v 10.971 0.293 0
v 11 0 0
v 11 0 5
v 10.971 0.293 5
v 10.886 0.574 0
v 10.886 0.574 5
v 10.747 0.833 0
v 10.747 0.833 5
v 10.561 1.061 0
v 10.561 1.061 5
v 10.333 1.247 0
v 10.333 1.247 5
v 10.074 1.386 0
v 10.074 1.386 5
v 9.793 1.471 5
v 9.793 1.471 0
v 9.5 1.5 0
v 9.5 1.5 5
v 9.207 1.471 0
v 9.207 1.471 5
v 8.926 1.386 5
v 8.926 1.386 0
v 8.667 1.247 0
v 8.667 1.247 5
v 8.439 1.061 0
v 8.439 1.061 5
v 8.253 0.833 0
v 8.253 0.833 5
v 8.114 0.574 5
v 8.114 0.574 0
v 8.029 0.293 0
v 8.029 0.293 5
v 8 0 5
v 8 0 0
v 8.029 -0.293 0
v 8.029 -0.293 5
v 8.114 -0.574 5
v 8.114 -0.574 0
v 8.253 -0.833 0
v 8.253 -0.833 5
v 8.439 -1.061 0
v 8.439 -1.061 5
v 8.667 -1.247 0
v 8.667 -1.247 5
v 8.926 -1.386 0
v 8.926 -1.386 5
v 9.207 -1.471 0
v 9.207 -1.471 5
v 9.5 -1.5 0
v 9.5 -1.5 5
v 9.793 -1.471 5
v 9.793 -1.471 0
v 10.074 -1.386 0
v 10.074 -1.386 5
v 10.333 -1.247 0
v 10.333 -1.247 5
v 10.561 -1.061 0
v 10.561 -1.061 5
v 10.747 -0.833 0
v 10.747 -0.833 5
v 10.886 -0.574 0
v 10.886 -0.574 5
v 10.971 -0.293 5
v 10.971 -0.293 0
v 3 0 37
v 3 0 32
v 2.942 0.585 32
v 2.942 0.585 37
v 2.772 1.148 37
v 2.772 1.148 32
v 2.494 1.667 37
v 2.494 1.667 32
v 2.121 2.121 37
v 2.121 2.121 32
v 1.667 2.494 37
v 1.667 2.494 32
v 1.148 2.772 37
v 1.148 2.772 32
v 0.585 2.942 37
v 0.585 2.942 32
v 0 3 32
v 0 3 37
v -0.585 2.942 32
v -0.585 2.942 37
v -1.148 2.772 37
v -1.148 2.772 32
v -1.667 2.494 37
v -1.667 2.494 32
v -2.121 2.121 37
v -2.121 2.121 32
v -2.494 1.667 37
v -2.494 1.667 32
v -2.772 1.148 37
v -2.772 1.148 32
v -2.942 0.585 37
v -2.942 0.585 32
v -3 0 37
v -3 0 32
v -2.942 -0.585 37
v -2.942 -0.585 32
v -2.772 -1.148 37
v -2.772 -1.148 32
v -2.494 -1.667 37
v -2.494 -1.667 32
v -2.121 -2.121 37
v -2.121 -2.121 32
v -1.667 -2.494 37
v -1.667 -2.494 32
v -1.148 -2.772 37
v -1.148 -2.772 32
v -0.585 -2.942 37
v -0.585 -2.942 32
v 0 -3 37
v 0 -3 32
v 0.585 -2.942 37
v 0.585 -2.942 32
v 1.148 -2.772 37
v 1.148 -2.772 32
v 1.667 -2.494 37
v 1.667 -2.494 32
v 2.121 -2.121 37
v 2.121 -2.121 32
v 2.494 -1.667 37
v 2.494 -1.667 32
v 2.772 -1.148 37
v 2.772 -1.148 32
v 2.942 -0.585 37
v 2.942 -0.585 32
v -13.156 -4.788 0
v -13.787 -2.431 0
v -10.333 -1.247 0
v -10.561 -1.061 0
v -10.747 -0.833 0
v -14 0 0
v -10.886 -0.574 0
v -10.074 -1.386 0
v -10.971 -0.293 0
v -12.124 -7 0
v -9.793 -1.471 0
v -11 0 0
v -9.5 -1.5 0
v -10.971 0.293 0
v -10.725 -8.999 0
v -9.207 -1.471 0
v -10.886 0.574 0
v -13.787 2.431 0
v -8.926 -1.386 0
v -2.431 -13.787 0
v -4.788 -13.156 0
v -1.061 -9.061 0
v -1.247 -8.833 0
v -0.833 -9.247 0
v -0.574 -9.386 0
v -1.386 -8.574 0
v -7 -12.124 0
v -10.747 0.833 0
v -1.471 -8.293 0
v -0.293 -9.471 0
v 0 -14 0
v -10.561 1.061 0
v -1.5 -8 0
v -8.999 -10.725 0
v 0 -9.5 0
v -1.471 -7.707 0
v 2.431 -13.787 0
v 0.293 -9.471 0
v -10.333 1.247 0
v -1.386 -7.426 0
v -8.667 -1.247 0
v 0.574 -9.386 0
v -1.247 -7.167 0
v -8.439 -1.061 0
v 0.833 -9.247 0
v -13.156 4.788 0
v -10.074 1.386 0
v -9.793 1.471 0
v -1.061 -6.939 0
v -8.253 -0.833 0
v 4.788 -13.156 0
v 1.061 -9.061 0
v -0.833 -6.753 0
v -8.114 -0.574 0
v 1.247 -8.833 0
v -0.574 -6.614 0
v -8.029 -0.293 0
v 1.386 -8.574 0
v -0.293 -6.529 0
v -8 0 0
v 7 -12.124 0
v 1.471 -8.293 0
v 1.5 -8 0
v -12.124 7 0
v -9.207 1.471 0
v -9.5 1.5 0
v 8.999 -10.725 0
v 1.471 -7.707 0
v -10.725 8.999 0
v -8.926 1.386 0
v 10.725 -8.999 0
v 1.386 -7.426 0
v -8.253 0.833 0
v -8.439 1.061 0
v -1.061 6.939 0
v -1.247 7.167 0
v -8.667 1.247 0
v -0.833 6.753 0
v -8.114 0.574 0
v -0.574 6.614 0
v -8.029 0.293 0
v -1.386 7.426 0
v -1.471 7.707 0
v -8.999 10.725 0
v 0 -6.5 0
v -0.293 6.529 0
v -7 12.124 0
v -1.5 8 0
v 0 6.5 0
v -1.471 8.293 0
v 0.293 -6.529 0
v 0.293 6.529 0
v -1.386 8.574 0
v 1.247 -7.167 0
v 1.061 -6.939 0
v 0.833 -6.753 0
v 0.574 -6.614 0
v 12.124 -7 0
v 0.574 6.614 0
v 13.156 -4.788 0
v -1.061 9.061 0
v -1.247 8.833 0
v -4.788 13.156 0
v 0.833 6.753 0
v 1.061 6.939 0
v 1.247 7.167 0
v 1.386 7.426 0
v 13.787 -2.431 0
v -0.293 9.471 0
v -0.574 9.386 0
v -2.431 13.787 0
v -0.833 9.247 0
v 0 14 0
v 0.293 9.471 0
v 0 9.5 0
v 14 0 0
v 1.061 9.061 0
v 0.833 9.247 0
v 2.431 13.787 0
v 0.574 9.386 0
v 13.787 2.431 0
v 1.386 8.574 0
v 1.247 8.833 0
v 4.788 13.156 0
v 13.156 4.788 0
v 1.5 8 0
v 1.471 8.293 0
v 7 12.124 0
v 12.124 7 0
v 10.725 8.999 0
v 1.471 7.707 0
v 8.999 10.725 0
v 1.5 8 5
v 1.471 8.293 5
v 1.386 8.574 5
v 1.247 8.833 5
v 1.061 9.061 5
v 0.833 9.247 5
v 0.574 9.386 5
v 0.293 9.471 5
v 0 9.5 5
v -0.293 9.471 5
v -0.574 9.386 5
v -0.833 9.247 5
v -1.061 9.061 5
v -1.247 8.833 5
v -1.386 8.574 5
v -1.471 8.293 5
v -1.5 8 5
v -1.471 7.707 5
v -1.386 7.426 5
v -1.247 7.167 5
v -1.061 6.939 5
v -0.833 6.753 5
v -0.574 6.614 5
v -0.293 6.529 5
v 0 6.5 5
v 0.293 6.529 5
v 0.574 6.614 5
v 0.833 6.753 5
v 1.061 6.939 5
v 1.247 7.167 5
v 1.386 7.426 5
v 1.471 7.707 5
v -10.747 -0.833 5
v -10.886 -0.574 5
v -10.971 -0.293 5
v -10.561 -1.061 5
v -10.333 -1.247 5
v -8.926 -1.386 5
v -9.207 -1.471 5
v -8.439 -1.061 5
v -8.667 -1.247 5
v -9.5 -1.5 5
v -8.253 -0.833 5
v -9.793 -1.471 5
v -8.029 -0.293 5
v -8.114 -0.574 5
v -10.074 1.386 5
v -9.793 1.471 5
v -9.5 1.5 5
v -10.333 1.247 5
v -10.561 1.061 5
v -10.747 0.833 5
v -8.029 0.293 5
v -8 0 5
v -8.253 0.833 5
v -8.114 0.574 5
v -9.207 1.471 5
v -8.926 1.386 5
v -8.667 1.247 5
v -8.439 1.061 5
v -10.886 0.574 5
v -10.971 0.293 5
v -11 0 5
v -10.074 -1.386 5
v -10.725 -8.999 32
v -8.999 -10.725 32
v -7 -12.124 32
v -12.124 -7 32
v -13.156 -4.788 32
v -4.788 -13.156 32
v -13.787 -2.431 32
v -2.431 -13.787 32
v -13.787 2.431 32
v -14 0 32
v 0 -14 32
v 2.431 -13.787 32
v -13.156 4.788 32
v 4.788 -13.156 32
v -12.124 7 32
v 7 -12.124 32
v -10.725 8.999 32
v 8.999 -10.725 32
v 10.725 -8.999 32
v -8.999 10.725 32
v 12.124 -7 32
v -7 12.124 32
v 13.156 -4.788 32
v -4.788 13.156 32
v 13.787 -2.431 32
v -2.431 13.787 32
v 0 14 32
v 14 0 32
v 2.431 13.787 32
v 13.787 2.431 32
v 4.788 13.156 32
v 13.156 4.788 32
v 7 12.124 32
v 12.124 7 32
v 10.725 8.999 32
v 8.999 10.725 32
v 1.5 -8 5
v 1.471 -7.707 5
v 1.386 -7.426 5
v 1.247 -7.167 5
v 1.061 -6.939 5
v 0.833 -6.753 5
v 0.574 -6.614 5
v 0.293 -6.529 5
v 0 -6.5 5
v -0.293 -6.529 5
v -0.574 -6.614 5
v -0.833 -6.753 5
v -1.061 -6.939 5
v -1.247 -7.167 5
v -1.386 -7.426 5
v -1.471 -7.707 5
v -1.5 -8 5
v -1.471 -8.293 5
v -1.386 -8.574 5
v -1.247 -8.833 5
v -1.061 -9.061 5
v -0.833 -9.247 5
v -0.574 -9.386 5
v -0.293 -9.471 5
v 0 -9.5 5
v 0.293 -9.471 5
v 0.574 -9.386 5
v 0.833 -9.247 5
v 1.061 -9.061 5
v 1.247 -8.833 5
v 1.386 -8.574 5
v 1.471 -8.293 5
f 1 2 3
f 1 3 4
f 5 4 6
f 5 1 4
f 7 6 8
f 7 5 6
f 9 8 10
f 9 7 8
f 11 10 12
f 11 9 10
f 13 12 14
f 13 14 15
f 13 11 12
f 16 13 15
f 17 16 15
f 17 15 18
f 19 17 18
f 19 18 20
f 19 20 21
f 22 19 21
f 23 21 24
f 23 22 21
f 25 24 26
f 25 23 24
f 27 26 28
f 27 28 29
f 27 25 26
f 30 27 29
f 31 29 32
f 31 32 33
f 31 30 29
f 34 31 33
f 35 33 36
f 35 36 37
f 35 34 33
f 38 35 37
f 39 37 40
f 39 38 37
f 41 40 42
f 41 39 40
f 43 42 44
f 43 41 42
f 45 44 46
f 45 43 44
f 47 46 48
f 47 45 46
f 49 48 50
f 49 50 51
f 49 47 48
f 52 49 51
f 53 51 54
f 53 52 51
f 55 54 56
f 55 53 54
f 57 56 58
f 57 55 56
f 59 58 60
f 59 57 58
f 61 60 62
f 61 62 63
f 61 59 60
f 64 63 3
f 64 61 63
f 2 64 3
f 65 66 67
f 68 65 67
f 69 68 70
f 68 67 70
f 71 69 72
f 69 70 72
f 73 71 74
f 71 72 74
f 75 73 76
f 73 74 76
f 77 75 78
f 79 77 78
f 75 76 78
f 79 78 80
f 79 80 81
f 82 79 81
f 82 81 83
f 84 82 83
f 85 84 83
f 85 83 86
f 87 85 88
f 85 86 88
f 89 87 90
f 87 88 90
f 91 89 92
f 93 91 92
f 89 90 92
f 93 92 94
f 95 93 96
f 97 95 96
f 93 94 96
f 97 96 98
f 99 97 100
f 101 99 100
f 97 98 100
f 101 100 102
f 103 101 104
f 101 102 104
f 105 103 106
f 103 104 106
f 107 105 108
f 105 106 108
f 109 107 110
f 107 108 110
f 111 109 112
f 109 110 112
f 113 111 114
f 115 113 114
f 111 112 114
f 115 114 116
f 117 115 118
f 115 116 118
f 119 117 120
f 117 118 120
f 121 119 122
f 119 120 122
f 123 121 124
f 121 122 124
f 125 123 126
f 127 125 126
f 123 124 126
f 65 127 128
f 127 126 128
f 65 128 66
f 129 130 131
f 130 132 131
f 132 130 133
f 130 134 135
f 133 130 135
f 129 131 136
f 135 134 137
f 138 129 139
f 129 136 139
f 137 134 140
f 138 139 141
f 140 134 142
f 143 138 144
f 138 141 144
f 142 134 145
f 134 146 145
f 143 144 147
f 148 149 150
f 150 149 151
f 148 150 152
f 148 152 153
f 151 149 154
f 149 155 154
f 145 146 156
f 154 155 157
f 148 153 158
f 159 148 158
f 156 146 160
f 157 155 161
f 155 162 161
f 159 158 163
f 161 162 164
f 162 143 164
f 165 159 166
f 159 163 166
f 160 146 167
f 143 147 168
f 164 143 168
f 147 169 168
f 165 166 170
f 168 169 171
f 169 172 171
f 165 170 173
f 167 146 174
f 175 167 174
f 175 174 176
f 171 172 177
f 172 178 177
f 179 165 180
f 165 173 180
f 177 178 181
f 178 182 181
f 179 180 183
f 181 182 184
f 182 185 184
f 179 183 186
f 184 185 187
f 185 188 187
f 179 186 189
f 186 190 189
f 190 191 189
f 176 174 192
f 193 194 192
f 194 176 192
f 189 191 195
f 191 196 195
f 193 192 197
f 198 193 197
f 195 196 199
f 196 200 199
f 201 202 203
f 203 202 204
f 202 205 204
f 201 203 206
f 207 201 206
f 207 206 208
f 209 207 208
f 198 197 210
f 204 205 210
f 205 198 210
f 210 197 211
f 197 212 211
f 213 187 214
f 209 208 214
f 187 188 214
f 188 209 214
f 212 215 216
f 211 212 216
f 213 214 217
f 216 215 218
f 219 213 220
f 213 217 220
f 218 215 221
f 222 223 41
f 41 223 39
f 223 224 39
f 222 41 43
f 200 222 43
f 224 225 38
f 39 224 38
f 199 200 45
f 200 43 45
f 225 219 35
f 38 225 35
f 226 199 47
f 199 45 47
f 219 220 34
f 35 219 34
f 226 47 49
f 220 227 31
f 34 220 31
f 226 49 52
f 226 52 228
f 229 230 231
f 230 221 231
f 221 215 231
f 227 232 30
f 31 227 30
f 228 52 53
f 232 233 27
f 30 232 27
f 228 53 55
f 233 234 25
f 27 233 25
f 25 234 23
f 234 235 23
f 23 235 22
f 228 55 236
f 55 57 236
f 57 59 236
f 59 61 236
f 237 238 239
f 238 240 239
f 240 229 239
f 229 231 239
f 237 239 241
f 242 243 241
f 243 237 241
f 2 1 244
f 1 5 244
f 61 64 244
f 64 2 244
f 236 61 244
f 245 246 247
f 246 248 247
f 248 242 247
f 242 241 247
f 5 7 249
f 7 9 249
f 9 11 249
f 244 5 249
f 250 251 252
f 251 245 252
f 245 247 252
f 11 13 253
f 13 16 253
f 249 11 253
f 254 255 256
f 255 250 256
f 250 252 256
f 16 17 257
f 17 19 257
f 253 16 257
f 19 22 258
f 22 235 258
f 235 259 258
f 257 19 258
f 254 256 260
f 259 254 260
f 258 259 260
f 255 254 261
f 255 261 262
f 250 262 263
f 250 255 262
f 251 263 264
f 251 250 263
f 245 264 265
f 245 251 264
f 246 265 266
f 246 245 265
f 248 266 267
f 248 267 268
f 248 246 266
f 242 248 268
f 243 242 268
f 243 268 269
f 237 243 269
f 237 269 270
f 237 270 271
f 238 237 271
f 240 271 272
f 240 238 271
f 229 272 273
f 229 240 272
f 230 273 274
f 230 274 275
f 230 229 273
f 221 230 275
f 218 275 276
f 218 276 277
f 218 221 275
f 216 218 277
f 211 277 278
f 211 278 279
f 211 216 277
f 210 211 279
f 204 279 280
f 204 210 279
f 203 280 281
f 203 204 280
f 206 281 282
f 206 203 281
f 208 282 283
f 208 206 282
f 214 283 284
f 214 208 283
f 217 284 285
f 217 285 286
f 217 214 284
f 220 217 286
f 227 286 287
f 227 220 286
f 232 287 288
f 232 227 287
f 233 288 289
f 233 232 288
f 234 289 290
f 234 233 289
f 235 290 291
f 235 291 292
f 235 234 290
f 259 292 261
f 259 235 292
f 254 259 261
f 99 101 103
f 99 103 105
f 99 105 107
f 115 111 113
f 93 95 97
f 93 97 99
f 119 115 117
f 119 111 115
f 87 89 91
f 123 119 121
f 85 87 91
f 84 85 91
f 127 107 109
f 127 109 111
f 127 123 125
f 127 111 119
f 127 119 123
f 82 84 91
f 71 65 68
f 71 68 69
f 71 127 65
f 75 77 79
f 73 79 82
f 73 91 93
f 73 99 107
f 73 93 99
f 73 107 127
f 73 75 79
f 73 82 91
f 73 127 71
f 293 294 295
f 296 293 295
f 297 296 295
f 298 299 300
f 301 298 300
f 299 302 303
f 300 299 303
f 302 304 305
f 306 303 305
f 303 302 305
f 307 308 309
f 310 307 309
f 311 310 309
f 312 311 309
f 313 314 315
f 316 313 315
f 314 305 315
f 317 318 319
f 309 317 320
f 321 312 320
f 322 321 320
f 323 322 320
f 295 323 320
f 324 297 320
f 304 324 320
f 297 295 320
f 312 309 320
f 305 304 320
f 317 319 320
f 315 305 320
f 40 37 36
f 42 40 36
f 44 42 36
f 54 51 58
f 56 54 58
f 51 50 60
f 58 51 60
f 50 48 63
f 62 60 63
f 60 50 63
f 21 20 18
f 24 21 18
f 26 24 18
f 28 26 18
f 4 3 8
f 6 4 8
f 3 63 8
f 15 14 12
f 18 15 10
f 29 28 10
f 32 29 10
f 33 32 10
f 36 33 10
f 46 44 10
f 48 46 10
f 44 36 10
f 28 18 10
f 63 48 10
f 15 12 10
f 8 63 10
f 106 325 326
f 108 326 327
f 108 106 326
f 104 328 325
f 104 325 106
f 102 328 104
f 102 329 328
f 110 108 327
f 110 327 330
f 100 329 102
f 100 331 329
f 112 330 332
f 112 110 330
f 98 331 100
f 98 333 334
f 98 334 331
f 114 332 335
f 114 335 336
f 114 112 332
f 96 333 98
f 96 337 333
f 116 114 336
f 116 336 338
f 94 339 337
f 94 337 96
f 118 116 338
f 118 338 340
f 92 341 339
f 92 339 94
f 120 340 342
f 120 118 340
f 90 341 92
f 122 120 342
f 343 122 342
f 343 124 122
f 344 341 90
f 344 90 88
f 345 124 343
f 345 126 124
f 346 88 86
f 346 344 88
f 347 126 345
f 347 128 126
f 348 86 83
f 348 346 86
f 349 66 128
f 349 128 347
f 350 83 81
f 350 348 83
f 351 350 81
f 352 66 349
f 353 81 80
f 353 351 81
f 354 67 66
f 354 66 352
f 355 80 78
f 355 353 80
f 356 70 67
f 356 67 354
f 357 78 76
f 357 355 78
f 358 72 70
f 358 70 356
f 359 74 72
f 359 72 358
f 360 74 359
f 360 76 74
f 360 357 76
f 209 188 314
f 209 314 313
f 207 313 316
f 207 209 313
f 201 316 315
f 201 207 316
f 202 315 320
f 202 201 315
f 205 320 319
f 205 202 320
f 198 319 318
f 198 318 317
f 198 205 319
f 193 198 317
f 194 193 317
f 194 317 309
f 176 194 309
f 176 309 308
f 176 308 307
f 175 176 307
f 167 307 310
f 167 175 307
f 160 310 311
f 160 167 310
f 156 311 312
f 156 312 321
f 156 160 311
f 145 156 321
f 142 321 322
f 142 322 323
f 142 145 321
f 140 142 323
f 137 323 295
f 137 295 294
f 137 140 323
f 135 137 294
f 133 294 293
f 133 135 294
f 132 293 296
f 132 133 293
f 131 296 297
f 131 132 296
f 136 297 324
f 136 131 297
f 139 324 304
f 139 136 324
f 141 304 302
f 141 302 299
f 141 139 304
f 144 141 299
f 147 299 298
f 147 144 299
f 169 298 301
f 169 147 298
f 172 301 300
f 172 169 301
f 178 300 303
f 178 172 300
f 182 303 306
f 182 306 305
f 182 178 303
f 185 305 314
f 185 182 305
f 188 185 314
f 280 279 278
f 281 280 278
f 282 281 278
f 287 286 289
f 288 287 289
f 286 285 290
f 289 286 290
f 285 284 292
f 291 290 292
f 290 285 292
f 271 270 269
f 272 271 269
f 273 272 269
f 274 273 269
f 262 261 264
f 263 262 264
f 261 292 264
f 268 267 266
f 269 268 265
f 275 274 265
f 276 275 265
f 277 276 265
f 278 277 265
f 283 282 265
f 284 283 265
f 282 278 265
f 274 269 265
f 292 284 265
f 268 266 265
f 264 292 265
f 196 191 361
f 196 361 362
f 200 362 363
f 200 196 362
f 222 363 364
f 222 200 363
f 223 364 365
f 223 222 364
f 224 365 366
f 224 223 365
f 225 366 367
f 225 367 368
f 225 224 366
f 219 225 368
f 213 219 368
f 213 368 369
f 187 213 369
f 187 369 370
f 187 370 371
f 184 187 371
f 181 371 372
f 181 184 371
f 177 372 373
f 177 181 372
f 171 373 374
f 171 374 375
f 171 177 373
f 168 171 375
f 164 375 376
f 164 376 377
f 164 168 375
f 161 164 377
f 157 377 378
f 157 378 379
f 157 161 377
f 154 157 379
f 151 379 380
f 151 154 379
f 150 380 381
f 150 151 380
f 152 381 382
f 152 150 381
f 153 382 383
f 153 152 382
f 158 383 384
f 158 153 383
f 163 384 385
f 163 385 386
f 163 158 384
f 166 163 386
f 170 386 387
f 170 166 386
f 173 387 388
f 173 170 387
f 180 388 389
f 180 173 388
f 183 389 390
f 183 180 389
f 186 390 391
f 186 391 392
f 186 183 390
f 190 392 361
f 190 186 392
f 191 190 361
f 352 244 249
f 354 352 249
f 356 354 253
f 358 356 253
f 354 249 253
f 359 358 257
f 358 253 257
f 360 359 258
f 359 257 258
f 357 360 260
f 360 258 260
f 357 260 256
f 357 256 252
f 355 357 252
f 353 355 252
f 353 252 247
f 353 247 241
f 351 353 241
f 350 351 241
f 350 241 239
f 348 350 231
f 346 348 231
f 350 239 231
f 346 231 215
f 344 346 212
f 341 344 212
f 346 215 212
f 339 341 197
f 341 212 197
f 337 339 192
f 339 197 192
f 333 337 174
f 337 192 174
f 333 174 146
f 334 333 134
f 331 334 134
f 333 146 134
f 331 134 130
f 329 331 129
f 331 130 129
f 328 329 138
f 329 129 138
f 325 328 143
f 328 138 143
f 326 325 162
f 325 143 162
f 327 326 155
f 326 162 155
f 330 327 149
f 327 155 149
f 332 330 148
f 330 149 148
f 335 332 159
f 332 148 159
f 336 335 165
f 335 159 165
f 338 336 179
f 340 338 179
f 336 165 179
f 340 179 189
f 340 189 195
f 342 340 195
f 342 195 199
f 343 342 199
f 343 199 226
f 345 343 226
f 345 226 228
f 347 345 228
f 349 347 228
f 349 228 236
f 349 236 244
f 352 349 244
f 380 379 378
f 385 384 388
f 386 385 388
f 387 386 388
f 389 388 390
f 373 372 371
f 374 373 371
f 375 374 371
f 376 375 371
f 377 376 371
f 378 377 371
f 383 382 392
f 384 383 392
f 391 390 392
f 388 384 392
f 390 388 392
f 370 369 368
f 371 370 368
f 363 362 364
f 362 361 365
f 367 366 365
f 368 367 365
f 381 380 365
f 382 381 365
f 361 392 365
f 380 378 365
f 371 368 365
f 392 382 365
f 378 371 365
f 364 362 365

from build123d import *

# Parameters (mm, degrees)
SKETCH1_R           = 14
BOSS_EXTRUDE1_DEPTH = 32
SKETCH1_3_R         = 1.5
CUT_EXTRUDE1_DEPTH  = 5
SKETCH2_R           = 3
BOSS_EXTRUDE2_DEPTH = 5


with BuildPart() as part:
    # Sketch1 → Boss-Extrude1 (new body)
    with BuildSketch(Plane.XY):
        Circle(SKETCH1_R)
    extrude(amount=BOSS_EXTRUDE1_DEPTH)

    # Sketch1<3> → Cut-Extrude1 (cut)
    with BuildSketch(Plane.XY):
        with Locations((-9.5, 0)):
            Circle(SKETCH1_3_R)
        with Locations((0, 8)):
            Circle(SKETCH1_3_R)
        with Locations((0, -8)):
            Circle(SKETCH1_3_R)
        with Locations((9.5, 0)):
            Circle(SKETCH1_3_R)
    extrude(amount=CUT_EXTRUDE1_DEPTH, mode=Mode.SUBTRACT)

    # Sketch2 → Boss-Extrude2 (add)
    with BuildSketch(Plane.XY.offset(32)):
        Circle(SKETCH2_R)
    extrude(amount=BOSS_EXTRUDE2_DEPTH)


solid = part.part
